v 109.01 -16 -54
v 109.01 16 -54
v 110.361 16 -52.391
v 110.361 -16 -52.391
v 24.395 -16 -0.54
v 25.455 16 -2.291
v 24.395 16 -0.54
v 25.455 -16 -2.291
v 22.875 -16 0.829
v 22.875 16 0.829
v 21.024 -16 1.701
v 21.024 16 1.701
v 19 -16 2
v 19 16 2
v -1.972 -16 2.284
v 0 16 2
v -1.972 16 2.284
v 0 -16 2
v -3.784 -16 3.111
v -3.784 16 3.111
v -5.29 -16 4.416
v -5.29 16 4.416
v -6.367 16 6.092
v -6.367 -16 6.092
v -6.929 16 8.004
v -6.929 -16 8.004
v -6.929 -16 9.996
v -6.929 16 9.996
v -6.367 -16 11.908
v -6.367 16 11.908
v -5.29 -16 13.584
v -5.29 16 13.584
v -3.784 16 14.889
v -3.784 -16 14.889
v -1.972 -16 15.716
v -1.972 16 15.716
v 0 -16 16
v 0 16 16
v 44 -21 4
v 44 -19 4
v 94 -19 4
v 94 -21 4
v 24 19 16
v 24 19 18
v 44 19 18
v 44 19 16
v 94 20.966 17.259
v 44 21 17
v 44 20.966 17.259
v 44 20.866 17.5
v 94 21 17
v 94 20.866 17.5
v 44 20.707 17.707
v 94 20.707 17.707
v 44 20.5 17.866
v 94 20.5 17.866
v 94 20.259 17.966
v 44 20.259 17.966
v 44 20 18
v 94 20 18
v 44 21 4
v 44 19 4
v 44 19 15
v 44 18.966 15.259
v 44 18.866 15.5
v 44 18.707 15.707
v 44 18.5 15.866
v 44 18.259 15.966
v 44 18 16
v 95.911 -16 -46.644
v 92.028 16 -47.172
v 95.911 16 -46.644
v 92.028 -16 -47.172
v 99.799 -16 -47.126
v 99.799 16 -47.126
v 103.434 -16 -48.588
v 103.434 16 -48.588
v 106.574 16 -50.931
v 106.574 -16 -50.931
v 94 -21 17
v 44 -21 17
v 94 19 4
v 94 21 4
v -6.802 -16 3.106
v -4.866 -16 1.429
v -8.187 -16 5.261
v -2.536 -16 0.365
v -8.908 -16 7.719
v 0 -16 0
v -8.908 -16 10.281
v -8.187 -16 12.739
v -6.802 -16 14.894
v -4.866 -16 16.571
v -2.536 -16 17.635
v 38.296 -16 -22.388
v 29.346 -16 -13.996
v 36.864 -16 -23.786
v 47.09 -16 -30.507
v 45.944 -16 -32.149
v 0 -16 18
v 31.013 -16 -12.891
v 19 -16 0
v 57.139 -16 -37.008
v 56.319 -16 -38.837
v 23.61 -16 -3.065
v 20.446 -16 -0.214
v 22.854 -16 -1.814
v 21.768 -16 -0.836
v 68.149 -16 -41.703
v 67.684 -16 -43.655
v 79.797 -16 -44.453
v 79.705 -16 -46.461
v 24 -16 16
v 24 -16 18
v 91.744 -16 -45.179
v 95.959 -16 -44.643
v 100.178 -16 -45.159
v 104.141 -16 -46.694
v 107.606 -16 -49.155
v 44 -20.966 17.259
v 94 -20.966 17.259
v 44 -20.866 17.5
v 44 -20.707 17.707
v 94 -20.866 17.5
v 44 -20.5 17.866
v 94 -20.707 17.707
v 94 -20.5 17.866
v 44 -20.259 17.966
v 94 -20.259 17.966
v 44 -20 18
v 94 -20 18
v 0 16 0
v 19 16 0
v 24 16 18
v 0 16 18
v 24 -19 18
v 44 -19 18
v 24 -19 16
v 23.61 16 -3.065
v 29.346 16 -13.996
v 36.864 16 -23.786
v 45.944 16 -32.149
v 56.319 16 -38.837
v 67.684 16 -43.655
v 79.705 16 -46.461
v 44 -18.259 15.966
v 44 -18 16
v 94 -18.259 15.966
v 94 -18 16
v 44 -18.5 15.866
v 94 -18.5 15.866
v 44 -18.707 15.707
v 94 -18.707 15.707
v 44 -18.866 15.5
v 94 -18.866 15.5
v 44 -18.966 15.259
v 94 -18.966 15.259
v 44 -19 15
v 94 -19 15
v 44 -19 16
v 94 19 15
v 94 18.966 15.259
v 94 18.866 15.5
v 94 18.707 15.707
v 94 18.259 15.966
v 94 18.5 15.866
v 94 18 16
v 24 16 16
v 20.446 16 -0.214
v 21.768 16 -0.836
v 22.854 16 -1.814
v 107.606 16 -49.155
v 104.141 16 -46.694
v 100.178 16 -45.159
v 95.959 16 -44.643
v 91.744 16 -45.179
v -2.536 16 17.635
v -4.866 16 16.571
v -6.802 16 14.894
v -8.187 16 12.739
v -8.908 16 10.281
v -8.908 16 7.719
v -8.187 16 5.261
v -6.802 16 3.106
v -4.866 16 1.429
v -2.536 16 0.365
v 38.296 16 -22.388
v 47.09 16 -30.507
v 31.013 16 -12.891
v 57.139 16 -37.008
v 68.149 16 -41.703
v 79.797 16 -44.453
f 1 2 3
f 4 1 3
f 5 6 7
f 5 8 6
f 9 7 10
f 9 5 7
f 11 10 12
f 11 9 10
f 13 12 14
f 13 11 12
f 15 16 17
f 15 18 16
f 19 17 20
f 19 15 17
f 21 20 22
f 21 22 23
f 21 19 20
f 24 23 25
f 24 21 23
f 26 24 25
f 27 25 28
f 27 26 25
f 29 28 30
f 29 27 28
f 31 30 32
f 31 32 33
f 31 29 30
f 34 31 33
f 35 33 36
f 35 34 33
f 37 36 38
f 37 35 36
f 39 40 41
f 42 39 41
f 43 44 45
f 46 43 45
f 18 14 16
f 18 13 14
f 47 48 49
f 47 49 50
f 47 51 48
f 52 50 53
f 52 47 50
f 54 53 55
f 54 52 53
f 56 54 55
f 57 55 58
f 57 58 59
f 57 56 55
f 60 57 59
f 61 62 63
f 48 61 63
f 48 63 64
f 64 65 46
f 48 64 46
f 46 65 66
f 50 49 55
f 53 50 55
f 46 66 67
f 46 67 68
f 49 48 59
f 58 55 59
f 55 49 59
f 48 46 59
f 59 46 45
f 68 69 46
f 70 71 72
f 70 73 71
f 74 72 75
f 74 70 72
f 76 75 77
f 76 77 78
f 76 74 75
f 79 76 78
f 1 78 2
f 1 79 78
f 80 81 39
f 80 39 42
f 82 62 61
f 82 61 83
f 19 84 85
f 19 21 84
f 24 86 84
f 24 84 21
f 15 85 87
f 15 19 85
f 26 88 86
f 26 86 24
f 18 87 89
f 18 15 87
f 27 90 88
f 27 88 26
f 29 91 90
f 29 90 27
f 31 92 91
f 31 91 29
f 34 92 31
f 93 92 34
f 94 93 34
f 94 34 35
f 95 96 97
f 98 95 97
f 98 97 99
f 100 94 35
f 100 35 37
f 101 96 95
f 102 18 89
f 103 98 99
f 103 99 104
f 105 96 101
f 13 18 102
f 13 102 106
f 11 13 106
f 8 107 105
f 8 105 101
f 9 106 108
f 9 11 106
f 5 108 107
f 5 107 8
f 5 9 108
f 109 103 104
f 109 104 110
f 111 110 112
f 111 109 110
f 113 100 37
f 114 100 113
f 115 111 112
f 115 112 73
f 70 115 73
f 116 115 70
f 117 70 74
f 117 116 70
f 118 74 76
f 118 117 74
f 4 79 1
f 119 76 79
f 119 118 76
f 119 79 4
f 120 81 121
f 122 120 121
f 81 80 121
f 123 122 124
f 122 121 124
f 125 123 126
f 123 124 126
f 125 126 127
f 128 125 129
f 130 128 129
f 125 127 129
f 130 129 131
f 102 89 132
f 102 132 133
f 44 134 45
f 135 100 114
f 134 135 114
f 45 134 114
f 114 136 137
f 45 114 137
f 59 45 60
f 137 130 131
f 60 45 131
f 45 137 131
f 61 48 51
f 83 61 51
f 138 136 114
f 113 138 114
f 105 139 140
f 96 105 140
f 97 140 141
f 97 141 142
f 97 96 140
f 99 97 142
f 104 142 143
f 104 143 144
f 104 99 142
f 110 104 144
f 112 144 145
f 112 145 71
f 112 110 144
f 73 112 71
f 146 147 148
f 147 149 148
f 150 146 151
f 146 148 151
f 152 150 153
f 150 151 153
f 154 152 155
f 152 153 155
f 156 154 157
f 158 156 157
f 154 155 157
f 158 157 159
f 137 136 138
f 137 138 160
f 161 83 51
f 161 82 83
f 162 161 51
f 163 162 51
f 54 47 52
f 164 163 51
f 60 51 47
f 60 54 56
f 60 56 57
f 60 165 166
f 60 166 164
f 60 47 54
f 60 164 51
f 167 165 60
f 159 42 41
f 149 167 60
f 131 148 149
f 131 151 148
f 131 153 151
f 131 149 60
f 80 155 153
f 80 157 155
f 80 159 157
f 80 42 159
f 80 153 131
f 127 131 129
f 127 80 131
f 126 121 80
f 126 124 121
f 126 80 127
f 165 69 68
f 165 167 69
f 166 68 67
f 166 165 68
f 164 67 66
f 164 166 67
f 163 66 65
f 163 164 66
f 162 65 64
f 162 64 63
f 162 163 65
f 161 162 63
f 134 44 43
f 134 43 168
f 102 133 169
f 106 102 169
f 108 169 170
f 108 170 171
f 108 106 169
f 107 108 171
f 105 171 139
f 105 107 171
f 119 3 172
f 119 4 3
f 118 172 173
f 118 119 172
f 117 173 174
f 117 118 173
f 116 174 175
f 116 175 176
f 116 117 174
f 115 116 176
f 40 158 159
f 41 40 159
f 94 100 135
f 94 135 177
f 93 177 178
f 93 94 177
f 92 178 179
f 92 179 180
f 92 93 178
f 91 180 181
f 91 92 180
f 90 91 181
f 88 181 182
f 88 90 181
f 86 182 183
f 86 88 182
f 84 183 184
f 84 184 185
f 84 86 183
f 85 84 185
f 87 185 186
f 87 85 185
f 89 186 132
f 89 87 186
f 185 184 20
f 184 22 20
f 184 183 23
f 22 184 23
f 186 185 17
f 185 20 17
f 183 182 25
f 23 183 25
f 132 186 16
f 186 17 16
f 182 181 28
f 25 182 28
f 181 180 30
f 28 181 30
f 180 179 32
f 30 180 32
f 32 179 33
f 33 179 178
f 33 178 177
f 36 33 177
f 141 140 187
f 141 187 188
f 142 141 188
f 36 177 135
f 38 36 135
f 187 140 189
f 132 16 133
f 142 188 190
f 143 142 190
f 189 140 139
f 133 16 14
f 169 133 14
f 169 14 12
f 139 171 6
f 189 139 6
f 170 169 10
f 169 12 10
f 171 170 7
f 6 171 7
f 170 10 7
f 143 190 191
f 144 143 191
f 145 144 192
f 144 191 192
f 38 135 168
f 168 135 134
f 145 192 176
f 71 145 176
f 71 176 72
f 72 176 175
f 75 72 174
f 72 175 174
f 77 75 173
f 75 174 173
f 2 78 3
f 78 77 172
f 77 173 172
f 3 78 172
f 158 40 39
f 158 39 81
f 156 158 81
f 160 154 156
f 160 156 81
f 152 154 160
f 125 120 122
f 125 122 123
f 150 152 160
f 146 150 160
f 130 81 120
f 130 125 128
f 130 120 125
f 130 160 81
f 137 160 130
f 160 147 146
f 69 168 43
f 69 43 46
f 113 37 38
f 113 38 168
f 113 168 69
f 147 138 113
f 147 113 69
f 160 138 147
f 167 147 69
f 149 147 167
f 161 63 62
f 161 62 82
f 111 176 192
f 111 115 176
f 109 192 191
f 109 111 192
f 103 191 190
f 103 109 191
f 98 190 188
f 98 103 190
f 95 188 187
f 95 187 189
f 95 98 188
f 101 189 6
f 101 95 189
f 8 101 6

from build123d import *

# Parameters (mm, degrees)
F1_DEPTH = 16
F2_W     = 70
F2_H     = 3
F3_DEPTH = 2
F4_W     = 50
F4_H     = 14
F5_DEPTH = 2
F6_R     = 1


with BuildPart() as f1:
    # F0 (on Front) → F1 (new body)
    with BuildSketch(Plane.XZ):
        with BuildLine():
            Line((94, 18), (0, 18))
            ThreePointArc((0, 18), (-9, 9), (0, 0))
            Line((0, 0), (19, 0))
            ThreePointArc((19, 0), (21.7681124643, -0.8361612201), (23.6103896104, -3.064978646))
            ThreePointArc((23.6103896104, -3.064978646), (50.9877645087, -35.7155080232), (92.0282848079, -47.1720964556))
            ThreePointArc((92.0282848079, -47.1720964556), (101.6638981451, -47.7394028226), (109.0104486201, -54))
            Line((109.0104486201, -54), (110.3606353849, -52.3909100723))
            ThreePointArc((110.3606353849, -52.3909100723), (102.2069764649, -45.8036465806), (91.7435184361, -45.1789545189))
            ThreePointArc((91.7435184361, -45.1789545189), (51.9754606004, -33.9725556125), (25.4545454545, -2.2909701044))
            ThreePointArc((25.4545454545, -2.2909701044), (22.87535745, 0.8293742919), (19, 2))
            Line((19, 2), (0, 2))
            ThreePointArc((0, 2), (-7, 9), (0, 16))
            Line((0, 16), (94, 16))
            Line((94, 16), (94, 18))
        make_face()
    extrude(amount=F1_DEPTH)

    # F2 (on face) → F3 (join)
    with BuildSketch(Plane.XY.offset(18)):
        with Locations((59, -17.5)):
            Rectangle(F2_W, F2_H)
    extrude(amount=-F3_DEPTH)

    # F4 (on face) → F5 (join)
    with BuildSketch(Plane.XZ.offset(19)):
        with Locations((69, 11)):
            Rectangle(F4_W, F4_H)
    extrude(amount=F5_DEPTH)

    # F6
    f6_edges = [f1.edges().sort_by_distance(p)[0] for p in [
        (69, -21, 18),
        (69, -19, 16),
    ]]
    fillet(f6_edges, radius=F6_R)

    # F7: F1 across plane


with BuildPart() as f1_1:
    add(f1.part)
    add(f1.part.mirror(Plane.XZ))


solid = f1_1.part
